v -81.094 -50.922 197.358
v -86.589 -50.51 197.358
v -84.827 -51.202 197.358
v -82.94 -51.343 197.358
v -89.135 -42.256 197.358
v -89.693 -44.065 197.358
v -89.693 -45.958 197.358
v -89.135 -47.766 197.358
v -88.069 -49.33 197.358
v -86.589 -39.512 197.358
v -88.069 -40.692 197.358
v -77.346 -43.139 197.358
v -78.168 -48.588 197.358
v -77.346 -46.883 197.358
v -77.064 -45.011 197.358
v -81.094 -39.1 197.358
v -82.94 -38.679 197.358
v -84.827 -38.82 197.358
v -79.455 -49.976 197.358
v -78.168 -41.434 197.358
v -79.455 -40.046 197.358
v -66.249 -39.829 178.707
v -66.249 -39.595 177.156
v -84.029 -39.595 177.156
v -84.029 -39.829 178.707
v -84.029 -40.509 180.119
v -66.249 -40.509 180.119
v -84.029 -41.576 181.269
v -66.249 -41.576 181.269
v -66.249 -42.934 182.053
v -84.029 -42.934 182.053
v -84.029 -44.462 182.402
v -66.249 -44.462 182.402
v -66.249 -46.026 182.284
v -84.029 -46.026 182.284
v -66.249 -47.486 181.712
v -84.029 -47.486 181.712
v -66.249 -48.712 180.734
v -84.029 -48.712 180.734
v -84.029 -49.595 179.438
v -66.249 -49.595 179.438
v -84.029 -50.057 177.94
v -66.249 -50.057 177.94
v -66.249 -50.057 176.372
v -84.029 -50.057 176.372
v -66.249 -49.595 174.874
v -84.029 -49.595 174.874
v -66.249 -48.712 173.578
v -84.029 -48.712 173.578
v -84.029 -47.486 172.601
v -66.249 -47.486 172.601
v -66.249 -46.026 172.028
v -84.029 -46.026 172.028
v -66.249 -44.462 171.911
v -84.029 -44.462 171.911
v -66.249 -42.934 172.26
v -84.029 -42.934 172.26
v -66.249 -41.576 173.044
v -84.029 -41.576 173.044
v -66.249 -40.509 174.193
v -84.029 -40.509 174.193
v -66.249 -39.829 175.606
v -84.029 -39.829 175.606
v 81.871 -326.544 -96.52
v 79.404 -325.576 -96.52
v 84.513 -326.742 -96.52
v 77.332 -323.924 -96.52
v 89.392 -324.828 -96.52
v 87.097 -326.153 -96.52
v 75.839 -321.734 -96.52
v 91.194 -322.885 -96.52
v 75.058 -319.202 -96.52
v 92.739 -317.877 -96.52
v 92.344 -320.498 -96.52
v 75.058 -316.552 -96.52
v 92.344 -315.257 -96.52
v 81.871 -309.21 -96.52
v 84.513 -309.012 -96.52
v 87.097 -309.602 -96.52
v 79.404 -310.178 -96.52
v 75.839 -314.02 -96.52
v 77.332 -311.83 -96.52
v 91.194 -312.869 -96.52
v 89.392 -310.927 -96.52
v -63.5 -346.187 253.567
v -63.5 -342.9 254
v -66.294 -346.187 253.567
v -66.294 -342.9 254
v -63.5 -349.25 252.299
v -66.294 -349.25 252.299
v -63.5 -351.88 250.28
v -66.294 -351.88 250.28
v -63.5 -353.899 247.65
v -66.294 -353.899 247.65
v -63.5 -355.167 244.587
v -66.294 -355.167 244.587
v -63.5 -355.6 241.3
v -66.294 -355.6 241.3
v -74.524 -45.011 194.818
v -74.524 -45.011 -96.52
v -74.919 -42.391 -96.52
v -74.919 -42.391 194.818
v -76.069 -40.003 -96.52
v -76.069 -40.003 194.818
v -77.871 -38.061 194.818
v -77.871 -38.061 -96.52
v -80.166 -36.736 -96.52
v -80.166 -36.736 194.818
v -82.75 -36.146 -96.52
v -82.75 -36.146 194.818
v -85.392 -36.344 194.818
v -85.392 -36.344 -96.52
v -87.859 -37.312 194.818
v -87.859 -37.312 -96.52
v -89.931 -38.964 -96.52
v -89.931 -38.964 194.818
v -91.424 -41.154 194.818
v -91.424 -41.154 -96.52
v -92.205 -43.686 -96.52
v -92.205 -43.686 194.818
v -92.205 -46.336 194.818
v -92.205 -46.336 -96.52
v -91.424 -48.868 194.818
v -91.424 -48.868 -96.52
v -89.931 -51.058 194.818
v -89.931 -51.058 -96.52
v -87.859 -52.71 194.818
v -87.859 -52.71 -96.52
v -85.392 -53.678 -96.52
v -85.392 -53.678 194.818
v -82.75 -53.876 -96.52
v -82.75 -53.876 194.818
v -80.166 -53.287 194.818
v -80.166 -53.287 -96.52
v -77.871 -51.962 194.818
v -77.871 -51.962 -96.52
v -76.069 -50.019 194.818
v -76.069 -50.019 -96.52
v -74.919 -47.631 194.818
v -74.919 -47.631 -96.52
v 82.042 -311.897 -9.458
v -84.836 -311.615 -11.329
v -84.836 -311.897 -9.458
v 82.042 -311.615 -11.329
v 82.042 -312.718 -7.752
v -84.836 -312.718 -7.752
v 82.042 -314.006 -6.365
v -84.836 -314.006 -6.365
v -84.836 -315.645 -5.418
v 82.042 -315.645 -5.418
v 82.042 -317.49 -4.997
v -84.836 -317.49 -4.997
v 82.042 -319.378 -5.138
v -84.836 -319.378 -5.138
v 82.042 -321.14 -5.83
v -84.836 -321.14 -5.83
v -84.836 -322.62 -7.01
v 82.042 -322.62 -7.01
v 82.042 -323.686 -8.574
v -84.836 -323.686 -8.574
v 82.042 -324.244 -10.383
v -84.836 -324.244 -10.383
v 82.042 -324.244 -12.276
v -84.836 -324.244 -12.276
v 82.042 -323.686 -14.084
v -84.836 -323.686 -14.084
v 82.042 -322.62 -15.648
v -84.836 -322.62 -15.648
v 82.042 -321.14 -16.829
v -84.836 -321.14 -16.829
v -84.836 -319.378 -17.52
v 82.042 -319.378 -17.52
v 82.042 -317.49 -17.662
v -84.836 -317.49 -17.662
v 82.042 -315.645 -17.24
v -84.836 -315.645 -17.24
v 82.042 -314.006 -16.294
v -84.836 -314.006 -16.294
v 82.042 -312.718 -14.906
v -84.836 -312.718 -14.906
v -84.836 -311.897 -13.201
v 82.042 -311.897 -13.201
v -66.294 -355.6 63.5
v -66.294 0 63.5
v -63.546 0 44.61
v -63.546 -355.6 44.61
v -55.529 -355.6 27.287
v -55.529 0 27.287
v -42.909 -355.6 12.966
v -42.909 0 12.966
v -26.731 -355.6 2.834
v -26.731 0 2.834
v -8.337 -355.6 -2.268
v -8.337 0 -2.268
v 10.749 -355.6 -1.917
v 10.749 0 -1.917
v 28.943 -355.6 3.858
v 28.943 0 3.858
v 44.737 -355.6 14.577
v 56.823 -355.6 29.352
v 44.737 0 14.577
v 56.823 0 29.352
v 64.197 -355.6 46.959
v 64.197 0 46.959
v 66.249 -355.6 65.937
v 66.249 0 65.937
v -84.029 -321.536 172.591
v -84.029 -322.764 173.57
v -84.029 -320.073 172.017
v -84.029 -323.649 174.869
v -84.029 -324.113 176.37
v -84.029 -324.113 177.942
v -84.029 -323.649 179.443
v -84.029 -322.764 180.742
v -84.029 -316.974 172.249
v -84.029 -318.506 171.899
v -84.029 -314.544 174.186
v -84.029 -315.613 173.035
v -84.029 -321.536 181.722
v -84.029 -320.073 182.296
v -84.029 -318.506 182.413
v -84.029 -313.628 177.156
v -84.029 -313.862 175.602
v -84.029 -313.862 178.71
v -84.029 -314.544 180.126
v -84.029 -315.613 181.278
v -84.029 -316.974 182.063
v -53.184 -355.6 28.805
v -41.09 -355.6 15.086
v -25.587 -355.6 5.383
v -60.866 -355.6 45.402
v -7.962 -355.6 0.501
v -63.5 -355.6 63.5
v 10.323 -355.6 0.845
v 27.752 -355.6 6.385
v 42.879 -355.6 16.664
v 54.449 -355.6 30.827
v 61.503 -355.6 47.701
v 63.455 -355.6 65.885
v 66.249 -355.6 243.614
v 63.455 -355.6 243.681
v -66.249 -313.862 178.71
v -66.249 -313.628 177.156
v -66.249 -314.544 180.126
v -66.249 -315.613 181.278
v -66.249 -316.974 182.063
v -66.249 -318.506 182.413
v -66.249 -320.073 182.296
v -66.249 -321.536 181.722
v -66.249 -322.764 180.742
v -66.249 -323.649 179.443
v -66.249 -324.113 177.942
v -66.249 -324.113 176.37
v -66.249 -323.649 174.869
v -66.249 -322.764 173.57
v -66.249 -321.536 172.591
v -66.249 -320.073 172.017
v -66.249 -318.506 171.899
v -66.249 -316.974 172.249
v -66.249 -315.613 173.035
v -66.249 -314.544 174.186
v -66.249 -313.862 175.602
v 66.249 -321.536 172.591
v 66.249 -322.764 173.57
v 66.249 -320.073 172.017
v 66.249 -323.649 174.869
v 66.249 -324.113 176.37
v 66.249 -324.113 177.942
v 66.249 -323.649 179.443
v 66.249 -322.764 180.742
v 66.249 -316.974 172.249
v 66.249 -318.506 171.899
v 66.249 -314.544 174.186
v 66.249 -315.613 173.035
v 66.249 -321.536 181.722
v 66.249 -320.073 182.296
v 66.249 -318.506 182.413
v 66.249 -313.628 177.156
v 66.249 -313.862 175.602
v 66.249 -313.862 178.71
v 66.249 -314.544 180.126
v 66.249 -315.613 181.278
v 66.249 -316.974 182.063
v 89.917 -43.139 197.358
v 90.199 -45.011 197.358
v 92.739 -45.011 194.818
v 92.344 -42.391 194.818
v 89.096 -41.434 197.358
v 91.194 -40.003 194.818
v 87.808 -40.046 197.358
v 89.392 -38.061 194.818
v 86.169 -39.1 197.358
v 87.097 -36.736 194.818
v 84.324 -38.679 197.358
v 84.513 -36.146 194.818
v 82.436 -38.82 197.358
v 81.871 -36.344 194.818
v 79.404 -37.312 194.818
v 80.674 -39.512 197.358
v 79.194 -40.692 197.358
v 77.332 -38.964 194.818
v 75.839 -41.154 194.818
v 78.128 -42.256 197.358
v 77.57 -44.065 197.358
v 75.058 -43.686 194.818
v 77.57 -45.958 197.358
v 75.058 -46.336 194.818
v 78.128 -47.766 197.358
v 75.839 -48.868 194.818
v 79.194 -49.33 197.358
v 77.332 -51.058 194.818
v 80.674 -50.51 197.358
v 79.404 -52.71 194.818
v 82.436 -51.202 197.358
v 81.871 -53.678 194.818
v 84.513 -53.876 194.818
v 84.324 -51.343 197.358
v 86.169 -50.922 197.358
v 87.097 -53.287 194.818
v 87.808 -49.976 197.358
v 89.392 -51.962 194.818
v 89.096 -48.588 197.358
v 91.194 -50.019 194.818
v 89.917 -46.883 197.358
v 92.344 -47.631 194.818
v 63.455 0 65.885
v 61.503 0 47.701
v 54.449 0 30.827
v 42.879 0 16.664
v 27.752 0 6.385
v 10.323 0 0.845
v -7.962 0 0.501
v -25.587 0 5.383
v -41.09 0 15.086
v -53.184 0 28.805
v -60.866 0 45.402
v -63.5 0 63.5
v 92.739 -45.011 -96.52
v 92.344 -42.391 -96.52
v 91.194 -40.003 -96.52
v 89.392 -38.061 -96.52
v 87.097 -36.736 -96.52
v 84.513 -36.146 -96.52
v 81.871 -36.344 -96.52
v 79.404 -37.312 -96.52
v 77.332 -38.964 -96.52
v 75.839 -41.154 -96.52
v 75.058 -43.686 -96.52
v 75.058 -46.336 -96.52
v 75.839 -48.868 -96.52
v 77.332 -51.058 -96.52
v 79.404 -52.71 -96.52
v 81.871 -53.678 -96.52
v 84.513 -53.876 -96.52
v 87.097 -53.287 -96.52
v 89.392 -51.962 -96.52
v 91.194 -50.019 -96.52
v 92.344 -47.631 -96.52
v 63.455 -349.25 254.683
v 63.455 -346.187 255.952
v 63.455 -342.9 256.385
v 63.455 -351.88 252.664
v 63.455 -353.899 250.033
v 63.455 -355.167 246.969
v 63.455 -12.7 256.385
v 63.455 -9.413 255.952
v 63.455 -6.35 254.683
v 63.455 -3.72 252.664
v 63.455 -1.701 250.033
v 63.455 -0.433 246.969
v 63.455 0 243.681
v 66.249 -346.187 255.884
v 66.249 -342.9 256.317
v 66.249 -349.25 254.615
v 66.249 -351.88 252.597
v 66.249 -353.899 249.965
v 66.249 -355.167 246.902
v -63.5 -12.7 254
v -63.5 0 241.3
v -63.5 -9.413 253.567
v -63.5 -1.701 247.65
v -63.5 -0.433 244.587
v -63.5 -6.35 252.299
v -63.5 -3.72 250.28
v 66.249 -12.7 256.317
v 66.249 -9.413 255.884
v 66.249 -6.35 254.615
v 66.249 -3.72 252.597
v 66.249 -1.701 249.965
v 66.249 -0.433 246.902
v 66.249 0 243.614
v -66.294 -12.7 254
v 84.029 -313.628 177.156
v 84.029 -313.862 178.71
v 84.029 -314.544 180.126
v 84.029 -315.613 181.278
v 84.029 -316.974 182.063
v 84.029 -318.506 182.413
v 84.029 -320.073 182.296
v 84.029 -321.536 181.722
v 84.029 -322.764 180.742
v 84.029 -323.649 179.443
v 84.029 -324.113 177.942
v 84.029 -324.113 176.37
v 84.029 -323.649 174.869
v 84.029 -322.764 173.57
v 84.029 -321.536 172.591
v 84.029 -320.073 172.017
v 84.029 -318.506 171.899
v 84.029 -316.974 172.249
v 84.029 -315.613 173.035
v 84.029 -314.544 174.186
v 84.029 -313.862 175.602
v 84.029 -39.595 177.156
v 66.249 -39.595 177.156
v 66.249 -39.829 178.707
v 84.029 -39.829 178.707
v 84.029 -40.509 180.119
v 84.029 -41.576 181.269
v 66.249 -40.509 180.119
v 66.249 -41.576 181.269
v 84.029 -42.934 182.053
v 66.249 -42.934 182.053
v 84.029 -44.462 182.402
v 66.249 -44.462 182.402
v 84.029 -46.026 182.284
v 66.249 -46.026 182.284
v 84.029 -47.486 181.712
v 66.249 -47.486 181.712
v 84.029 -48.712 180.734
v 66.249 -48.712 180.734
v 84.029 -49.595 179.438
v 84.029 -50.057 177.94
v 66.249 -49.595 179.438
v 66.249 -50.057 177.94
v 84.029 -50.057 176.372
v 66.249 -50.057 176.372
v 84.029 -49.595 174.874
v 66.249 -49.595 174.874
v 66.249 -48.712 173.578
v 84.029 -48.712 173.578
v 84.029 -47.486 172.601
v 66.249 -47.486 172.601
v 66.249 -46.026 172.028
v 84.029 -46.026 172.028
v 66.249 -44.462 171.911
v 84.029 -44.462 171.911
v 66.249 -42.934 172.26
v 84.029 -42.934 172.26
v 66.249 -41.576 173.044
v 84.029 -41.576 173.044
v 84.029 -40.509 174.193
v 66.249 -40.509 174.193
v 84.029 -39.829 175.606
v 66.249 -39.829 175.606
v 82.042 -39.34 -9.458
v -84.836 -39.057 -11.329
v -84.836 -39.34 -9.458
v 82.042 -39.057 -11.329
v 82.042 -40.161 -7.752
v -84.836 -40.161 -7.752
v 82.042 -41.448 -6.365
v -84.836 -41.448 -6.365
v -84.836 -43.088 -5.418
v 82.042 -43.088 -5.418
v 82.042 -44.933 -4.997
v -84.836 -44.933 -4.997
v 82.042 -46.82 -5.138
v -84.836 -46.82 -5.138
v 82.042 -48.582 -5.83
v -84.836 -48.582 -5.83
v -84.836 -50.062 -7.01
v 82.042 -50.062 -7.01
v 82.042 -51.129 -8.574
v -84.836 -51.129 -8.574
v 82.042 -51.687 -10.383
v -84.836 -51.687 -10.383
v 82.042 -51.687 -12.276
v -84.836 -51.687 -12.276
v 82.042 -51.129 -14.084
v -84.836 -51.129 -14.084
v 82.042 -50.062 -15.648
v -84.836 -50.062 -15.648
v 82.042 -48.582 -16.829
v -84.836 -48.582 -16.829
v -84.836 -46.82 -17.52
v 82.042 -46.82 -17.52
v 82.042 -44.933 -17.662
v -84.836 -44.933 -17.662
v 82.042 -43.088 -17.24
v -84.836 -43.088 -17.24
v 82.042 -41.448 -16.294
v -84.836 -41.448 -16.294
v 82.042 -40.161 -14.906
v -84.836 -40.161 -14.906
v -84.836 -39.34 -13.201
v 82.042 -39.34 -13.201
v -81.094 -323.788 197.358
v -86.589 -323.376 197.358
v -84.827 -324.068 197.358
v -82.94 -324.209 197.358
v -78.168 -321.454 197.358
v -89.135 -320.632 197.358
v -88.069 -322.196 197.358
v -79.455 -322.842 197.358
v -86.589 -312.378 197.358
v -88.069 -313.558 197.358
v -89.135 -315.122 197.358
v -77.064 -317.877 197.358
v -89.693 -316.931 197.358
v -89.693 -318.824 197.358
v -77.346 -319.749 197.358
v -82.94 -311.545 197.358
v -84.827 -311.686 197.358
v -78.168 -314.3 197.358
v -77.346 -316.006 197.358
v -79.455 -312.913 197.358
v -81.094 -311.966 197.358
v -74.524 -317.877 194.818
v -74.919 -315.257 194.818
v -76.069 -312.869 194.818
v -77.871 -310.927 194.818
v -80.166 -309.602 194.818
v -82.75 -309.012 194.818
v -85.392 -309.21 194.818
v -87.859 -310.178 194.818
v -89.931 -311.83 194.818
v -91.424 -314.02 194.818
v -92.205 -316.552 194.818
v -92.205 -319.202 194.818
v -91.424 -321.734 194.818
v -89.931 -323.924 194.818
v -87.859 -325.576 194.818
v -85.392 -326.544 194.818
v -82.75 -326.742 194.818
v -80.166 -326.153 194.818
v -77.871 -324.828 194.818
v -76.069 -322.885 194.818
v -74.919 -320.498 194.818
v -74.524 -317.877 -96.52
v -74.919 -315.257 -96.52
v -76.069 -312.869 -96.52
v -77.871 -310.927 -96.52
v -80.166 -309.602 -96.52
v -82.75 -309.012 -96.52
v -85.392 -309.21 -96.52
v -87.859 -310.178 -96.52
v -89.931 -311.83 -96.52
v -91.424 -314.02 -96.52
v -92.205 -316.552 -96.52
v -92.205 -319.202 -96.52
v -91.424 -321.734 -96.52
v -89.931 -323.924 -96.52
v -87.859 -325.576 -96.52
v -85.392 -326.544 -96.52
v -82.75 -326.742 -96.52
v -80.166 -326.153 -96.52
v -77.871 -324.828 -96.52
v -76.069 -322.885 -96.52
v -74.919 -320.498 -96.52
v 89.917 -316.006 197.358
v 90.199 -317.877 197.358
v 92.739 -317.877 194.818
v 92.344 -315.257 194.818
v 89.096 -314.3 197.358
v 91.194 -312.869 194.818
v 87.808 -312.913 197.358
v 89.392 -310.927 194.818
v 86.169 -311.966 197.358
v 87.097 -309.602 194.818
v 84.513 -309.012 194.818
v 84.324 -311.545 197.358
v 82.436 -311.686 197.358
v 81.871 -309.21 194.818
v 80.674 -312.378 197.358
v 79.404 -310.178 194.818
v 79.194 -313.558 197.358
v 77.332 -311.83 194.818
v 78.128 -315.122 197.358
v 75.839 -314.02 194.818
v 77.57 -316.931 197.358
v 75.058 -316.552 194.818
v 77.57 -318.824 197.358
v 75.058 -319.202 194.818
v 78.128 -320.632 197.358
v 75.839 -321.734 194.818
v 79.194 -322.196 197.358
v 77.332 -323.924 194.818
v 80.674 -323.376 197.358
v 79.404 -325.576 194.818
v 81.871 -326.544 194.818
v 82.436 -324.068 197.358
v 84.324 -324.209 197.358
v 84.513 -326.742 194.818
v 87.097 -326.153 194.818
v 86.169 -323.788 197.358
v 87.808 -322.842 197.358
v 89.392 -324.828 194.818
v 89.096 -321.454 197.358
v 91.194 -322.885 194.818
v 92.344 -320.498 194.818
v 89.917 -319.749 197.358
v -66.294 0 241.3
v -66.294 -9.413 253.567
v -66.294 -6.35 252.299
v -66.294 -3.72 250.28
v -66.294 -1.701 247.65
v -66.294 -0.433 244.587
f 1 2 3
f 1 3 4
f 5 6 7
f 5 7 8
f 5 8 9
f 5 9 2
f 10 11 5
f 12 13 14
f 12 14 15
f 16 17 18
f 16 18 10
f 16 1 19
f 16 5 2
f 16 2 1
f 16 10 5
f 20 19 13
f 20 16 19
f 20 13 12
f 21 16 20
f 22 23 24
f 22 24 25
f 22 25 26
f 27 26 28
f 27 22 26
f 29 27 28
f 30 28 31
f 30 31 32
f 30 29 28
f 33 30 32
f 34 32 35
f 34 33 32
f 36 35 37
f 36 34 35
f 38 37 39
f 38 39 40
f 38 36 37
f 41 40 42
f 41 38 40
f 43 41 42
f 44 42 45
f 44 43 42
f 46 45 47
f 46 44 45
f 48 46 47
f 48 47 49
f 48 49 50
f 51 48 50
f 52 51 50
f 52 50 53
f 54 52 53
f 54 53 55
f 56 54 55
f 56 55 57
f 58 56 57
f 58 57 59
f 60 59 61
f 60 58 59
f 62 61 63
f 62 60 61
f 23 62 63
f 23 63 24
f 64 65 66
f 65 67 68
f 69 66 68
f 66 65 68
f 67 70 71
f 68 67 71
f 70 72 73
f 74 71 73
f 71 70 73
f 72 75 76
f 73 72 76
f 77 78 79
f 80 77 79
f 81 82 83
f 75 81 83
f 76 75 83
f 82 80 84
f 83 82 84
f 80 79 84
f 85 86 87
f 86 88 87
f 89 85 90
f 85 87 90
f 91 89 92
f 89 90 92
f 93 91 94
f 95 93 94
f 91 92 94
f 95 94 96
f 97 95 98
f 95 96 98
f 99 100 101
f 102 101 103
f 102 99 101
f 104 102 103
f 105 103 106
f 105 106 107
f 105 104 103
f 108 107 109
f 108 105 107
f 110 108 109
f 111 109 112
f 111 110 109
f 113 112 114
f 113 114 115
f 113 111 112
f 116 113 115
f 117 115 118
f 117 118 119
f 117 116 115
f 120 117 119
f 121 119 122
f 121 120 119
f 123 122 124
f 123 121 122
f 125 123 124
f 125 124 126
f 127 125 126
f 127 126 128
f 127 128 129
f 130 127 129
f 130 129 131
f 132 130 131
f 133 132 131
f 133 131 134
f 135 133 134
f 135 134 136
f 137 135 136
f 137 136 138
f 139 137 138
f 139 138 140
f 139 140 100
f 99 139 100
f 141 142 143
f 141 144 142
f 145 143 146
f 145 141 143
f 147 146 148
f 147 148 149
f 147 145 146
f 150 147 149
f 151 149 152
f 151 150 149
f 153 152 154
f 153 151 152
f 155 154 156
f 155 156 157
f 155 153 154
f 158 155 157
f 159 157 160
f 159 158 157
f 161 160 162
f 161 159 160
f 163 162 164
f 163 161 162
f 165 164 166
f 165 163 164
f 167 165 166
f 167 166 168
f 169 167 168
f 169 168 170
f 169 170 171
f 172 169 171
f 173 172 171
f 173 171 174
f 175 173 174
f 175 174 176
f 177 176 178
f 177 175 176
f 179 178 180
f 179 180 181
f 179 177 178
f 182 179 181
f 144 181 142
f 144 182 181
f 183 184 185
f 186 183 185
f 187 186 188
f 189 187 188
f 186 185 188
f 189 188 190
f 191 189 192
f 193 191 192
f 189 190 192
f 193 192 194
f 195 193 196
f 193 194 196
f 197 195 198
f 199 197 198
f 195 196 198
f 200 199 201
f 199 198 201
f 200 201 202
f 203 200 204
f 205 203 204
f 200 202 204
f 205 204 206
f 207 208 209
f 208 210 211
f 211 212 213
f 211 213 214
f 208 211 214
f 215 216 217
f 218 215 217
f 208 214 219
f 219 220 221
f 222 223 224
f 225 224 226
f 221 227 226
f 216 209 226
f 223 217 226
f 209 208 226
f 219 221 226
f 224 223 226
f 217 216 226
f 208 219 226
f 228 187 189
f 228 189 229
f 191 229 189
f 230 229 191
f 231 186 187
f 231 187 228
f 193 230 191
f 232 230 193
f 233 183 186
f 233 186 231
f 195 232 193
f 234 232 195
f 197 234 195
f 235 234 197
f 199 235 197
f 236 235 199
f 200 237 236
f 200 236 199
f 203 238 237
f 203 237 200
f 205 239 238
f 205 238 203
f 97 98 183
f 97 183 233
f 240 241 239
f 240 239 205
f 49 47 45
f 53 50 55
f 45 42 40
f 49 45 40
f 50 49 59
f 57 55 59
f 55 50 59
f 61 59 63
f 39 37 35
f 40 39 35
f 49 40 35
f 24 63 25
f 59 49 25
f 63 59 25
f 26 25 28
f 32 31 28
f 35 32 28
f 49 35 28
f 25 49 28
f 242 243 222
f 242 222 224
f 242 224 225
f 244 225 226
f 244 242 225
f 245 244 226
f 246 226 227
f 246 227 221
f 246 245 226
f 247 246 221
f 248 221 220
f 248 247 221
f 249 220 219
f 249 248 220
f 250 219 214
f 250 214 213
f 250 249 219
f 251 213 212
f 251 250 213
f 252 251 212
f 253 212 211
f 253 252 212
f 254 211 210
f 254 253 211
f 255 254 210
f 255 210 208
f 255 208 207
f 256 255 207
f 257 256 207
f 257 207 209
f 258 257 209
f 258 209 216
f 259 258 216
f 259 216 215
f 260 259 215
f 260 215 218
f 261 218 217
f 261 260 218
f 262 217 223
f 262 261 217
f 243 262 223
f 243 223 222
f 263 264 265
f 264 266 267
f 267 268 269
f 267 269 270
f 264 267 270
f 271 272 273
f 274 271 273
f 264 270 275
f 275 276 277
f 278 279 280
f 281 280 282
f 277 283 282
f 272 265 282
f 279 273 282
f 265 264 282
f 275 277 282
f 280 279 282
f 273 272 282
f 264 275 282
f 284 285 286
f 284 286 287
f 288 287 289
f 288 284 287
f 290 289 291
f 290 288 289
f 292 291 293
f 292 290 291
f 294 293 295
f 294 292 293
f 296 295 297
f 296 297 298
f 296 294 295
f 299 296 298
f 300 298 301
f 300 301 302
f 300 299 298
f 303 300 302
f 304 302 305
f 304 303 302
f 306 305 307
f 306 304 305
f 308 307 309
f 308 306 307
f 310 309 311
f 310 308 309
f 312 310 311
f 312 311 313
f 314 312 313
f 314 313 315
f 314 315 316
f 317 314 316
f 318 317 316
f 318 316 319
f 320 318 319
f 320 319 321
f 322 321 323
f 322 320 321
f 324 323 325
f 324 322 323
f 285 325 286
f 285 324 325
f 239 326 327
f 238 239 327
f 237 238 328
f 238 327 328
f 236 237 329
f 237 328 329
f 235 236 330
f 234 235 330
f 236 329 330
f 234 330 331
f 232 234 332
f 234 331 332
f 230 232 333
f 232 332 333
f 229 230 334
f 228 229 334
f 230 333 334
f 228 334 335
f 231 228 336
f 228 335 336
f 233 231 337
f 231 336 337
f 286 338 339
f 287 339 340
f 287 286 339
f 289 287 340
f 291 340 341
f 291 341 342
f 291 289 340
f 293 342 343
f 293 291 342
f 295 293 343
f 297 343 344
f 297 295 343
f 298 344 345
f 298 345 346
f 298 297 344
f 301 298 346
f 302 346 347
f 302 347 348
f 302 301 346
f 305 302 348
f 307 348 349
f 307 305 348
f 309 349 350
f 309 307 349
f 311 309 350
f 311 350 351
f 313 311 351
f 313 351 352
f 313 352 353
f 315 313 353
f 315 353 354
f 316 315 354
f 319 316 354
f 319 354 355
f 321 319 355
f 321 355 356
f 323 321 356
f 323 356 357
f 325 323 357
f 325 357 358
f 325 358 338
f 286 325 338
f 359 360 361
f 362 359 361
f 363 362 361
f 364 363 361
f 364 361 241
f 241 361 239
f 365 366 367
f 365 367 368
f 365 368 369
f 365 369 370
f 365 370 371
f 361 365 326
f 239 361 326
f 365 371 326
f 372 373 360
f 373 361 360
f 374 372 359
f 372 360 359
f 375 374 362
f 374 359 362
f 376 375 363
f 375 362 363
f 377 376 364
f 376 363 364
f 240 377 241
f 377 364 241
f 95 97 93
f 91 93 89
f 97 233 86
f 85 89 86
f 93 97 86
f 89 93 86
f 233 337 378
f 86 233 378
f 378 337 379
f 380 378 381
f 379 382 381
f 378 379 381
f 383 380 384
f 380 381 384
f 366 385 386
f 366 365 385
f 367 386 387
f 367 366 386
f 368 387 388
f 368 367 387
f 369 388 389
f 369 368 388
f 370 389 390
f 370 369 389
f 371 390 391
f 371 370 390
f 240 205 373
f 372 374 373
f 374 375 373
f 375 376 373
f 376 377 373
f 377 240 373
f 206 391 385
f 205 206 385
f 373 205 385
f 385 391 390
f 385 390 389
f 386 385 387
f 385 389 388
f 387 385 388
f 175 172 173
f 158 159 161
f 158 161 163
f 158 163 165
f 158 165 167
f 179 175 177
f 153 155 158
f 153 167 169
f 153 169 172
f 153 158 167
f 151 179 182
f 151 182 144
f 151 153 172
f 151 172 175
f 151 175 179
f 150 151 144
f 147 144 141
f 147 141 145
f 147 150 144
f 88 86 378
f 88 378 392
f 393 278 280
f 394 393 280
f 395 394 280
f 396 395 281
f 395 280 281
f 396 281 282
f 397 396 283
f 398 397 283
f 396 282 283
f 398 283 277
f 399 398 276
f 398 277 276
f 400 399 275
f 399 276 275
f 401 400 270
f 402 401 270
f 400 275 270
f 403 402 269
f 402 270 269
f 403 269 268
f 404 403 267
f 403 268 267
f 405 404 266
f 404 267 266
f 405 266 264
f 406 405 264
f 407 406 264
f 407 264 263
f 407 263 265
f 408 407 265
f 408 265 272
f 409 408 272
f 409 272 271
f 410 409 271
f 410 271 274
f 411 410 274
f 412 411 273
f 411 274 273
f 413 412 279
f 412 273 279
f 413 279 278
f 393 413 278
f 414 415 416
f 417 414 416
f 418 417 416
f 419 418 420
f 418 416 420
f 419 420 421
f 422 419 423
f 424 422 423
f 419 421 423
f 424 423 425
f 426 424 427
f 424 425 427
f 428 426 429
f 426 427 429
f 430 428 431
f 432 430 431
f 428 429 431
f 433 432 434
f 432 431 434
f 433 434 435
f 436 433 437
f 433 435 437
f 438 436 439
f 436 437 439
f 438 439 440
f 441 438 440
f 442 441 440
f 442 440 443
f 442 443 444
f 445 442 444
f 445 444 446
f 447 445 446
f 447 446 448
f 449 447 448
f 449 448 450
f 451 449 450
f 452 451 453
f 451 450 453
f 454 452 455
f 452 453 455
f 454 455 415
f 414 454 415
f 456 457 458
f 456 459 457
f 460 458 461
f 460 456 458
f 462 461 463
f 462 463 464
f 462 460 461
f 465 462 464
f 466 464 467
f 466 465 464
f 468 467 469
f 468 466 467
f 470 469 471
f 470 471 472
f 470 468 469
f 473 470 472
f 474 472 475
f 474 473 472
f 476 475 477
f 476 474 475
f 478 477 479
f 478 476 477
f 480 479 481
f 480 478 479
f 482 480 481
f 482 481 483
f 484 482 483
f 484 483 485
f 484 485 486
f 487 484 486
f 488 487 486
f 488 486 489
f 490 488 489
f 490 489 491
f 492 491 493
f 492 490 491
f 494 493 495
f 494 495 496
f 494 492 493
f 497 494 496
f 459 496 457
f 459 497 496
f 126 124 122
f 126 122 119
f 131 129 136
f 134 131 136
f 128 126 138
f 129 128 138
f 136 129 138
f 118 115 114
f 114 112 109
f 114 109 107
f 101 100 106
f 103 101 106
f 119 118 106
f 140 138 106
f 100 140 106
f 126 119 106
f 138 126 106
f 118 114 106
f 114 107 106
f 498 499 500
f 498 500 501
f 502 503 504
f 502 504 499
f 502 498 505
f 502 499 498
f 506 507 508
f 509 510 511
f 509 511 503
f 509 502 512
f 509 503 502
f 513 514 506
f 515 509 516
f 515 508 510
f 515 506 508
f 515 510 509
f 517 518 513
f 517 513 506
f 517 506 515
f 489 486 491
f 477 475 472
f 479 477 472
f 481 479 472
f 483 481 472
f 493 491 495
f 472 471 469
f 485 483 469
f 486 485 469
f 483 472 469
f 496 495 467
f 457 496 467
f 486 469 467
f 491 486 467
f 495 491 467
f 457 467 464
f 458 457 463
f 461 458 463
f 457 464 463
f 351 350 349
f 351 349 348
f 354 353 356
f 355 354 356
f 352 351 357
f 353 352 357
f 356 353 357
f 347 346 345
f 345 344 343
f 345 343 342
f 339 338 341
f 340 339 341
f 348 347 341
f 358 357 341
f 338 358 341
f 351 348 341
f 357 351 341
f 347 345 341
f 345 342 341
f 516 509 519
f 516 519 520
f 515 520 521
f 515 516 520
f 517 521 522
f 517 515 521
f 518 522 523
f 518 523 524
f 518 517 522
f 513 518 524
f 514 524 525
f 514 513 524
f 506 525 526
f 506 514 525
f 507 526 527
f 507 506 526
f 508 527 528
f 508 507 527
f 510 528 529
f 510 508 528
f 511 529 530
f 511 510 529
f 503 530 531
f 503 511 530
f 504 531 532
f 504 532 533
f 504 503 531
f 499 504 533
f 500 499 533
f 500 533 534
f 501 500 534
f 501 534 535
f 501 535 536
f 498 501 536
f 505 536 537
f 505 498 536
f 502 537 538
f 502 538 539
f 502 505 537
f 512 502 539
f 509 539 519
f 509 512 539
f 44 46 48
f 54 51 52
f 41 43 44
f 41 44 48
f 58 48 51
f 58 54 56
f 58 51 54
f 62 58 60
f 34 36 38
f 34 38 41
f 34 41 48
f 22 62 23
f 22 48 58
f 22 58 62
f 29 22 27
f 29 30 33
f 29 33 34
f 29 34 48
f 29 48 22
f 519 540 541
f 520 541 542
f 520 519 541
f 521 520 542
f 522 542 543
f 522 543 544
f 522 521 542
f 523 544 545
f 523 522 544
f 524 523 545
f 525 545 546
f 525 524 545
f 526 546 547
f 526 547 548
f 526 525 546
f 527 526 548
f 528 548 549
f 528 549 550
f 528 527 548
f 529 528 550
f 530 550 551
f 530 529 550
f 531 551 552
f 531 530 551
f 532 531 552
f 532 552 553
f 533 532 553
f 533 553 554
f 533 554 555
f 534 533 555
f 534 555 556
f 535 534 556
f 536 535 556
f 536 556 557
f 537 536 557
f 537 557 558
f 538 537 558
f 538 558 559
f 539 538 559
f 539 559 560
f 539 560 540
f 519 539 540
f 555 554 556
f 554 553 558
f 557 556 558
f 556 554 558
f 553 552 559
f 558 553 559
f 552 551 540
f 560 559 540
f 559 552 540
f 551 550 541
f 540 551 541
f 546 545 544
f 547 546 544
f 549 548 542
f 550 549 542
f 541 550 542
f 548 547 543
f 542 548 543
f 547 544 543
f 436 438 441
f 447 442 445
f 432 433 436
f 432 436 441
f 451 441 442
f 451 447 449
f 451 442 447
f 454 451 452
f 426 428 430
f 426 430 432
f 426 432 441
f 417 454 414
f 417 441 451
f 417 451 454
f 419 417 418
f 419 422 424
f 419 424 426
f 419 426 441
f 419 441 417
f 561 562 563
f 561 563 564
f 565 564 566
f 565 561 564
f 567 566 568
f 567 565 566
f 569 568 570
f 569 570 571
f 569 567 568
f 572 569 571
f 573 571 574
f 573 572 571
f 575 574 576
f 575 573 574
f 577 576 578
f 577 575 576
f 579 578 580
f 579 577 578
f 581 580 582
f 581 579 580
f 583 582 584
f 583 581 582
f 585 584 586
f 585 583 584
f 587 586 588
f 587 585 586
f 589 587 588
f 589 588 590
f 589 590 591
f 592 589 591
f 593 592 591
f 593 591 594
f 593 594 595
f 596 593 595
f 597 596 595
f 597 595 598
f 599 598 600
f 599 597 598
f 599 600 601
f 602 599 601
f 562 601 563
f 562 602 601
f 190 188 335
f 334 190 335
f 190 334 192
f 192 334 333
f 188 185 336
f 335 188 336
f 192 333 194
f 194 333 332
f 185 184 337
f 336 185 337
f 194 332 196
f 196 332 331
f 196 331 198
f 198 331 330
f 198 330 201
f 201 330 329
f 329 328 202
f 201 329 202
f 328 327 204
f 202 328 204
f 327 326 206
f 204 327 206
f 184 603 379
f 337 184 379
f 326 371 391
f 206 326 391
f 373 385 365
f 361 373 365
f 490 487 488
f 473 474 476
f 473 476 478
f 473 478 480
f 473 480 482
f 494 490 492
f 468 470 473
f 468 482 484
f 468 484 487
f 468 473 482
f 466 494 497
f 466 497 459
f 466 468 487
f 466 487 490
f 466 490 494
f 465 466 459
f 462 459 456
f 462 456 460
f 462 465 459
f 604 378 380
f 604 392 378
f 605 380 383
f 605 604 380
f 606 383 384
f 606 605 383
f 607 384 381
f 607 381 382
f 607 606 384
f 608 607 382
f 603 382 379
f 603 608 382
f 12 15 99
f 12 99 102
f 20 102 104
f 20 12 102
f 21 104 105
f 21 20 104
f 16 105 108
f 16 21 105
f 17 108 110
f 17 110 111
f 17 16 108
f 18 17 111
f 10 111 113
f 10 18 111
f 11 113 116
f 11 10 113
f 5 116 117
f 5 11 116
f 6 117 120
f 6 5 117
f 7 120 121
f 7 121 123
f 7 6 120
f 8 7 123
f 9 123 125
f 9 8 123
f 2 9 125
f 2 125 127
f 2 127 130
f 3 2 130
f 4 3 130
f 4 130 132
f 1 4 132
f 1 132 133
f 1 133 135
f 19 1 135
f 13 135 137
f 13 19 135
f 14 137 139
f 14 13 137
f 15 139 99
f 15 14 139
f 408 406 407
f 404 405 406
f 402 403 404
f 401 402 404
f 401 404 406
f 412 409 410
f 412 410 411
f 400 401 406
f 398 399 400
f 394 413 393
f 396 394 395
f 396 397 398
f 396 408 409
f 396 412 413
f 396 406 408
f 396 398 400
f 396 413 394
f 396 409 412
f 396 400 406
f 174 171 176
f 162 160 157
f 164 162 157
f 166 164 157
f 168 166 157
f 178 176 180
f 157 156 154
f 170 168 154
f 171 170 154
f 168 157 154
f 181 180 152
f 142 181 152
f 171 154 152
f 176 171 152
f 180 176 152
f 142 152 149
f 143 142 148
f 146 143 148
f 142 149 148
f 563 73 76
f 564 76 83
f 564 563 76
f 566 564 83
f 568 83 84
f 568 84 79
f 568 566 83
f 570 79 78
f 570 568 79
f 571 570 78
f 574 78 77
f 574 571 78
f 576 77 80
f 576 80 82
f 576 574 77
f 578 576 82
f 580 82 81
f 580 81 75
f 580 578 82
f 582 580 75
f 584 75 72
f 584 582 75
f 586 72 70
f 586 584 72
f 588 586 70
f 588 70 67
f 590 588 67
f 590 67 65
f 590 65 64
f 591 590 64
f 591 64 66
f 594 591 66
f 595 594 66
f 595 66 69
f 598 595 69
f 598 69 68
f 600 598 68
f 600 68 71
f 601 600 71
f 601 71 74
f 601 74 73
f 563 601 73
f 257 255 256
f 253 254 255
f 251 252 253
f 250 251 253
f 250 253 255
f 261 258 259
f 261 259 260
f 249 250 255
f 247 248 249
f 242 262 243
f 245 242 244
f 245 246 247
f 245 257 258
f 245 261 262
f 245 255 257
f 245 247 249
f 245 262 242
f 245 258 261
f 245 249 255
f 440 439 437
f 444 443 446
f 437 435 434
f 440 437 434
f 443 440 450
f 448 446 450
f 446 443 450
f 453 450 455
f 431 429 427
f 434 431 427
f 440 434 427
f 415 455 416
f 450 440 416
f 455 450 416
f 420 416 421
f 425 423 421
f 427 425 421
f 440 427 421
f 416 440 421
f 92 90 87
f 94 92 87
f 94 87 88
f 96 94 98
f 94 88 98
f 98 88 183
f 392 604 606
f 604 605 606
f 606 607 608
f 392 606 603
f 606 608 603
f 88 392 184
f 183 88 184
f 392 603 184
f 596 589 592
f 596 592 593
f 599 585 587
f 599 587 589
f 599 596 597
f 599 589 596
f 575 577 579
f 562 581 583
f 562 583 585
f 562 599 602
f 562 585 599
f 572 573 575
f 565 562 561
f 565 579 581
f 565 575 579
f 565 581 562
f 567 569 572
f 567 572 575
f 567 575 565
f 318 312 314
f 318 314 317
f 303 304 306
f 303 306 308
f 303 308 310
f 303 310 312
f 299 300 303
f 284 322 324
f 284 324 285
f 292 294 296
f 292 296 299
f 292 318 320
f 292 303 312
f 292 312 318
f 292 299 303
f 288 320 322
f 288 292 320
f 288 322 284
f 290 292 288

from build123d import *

# Parameters (mm, degrees)
F1_DEPTH      = 355.6
F2_R          = 12.7
F3_R          = 8.89
F4_DEPTH      = 197.358
F4_DEPTH_BACK = 96.52
F5_R          = 6.35
F6_DEPTH      = 82.042
F6_DEPTH_BACK = 84.836
F7_R          = 5.271729
F7_R_2        = 5.260203
F8_DEPTH      = 17.78
F10_SIZE      = 2.54


with BuildPart() as f1:
    # F0 (on Front) → F1 (new body)
    with BuildSketch(Plane.XZ):
        with BuildLine():
            ThreePointArc((63.455196, 65.884964), (1.192692, 0.011202), (-63.5, 63.5))
            Line((-63.5, 63.5), (-63.5, 254))
            Line((-63.5, 254), (-66.294, 254))
            Line((-66.294, 254), (-66.294, 63.5))
            ThreePointArc((-66.294, 63.5), (1.218649, -2.782798), (66.249196, 65.936886))
            Line((66.249196, 65.936886), (66.249196, 256.317355))
            Line((66.249196, 256.317355), (63.455196, 256.384964))
            Line((63.455196, 256.384964), (63.455196, 65.884964))
        make_face()
    extrude(amount=F1_DEPTH)

    # F2
    f2_edges = [f1.edges().sort_by_distance(p)[0] for p in [
        (-64.897, -355.6, 254),
        (64.852196, -355.6, 256.351159),
        (-64.897, 0, 254),
        (64.852196, 0, 256.351159),
    ]]
    fillet(f2_edges, radius=F2_R)


with BuildPart() as f4:
    # F3 (on Top) → F4 (new body, two sides)
    with BuildSketch(Plane.XY) as f4_sk:
        with Locations((-83.414169, -45.011092)):
            Circle(F3_R)
        with Locations((-83.414169, -317.877233)):
            Circle(F3_R)
        with Locations((83.848983, -317.877233)):
            Circle(F3_R)
        with Locations((83.848983, -45.011092)):
            Circle(F3_R)
    extrude(amount=F4_DEPTH)
    extrude(f4_sk.sketch, amount=-F4_DEPTH_BACK)

    # F10
    f10_edges = [f4.edges().sort_by_distance(p)[0] for p in [
        (-92.304169, -45.011092, 197.358),
        (-92.304169, -317.877233, 197.358),
        (74.958983, -317.877233, 197.358),
        (74.958983, -45.011092, 197.358),
    ]]
    chamfer(f10_edges, length=F10_SIZE)


with BuildPart() as f6:
    # F5 (on Right) → F6 (new body, two sides)
    with BuildSketch(Plane.YZ) as f6_sk:
        with Locations((-317.964863, -11.329267)):
            Circle(F5_R)
        with Locations((-45.407446, -11.329267)):
            Circle(F5_R)
    extrude(amount=F6_DEPTH)
    extrude(f6_sk.sketch, amount=-F6_DEPTH_BACK)


with BuildPart() as f8:
    # F7 (on face) → F8 (new body)
    with BuildSketch(Plane.YZ.offset(66.249196)):
        with Locations((-318.899721, 177.156106)):
            Circle(F7_R)
        with Locations((-44.855535, 177.156106)):
            Circle(F7_R_2)
    extrude(amount=F8_DEPTH)


with BuildPart() as f9_1:
    # F9: instance of F8
    add(f8.part.mirror(Plane.YZ))


solid = Compound([f1.part, f4.part, f6.part, f8.part, f9_1.part])
